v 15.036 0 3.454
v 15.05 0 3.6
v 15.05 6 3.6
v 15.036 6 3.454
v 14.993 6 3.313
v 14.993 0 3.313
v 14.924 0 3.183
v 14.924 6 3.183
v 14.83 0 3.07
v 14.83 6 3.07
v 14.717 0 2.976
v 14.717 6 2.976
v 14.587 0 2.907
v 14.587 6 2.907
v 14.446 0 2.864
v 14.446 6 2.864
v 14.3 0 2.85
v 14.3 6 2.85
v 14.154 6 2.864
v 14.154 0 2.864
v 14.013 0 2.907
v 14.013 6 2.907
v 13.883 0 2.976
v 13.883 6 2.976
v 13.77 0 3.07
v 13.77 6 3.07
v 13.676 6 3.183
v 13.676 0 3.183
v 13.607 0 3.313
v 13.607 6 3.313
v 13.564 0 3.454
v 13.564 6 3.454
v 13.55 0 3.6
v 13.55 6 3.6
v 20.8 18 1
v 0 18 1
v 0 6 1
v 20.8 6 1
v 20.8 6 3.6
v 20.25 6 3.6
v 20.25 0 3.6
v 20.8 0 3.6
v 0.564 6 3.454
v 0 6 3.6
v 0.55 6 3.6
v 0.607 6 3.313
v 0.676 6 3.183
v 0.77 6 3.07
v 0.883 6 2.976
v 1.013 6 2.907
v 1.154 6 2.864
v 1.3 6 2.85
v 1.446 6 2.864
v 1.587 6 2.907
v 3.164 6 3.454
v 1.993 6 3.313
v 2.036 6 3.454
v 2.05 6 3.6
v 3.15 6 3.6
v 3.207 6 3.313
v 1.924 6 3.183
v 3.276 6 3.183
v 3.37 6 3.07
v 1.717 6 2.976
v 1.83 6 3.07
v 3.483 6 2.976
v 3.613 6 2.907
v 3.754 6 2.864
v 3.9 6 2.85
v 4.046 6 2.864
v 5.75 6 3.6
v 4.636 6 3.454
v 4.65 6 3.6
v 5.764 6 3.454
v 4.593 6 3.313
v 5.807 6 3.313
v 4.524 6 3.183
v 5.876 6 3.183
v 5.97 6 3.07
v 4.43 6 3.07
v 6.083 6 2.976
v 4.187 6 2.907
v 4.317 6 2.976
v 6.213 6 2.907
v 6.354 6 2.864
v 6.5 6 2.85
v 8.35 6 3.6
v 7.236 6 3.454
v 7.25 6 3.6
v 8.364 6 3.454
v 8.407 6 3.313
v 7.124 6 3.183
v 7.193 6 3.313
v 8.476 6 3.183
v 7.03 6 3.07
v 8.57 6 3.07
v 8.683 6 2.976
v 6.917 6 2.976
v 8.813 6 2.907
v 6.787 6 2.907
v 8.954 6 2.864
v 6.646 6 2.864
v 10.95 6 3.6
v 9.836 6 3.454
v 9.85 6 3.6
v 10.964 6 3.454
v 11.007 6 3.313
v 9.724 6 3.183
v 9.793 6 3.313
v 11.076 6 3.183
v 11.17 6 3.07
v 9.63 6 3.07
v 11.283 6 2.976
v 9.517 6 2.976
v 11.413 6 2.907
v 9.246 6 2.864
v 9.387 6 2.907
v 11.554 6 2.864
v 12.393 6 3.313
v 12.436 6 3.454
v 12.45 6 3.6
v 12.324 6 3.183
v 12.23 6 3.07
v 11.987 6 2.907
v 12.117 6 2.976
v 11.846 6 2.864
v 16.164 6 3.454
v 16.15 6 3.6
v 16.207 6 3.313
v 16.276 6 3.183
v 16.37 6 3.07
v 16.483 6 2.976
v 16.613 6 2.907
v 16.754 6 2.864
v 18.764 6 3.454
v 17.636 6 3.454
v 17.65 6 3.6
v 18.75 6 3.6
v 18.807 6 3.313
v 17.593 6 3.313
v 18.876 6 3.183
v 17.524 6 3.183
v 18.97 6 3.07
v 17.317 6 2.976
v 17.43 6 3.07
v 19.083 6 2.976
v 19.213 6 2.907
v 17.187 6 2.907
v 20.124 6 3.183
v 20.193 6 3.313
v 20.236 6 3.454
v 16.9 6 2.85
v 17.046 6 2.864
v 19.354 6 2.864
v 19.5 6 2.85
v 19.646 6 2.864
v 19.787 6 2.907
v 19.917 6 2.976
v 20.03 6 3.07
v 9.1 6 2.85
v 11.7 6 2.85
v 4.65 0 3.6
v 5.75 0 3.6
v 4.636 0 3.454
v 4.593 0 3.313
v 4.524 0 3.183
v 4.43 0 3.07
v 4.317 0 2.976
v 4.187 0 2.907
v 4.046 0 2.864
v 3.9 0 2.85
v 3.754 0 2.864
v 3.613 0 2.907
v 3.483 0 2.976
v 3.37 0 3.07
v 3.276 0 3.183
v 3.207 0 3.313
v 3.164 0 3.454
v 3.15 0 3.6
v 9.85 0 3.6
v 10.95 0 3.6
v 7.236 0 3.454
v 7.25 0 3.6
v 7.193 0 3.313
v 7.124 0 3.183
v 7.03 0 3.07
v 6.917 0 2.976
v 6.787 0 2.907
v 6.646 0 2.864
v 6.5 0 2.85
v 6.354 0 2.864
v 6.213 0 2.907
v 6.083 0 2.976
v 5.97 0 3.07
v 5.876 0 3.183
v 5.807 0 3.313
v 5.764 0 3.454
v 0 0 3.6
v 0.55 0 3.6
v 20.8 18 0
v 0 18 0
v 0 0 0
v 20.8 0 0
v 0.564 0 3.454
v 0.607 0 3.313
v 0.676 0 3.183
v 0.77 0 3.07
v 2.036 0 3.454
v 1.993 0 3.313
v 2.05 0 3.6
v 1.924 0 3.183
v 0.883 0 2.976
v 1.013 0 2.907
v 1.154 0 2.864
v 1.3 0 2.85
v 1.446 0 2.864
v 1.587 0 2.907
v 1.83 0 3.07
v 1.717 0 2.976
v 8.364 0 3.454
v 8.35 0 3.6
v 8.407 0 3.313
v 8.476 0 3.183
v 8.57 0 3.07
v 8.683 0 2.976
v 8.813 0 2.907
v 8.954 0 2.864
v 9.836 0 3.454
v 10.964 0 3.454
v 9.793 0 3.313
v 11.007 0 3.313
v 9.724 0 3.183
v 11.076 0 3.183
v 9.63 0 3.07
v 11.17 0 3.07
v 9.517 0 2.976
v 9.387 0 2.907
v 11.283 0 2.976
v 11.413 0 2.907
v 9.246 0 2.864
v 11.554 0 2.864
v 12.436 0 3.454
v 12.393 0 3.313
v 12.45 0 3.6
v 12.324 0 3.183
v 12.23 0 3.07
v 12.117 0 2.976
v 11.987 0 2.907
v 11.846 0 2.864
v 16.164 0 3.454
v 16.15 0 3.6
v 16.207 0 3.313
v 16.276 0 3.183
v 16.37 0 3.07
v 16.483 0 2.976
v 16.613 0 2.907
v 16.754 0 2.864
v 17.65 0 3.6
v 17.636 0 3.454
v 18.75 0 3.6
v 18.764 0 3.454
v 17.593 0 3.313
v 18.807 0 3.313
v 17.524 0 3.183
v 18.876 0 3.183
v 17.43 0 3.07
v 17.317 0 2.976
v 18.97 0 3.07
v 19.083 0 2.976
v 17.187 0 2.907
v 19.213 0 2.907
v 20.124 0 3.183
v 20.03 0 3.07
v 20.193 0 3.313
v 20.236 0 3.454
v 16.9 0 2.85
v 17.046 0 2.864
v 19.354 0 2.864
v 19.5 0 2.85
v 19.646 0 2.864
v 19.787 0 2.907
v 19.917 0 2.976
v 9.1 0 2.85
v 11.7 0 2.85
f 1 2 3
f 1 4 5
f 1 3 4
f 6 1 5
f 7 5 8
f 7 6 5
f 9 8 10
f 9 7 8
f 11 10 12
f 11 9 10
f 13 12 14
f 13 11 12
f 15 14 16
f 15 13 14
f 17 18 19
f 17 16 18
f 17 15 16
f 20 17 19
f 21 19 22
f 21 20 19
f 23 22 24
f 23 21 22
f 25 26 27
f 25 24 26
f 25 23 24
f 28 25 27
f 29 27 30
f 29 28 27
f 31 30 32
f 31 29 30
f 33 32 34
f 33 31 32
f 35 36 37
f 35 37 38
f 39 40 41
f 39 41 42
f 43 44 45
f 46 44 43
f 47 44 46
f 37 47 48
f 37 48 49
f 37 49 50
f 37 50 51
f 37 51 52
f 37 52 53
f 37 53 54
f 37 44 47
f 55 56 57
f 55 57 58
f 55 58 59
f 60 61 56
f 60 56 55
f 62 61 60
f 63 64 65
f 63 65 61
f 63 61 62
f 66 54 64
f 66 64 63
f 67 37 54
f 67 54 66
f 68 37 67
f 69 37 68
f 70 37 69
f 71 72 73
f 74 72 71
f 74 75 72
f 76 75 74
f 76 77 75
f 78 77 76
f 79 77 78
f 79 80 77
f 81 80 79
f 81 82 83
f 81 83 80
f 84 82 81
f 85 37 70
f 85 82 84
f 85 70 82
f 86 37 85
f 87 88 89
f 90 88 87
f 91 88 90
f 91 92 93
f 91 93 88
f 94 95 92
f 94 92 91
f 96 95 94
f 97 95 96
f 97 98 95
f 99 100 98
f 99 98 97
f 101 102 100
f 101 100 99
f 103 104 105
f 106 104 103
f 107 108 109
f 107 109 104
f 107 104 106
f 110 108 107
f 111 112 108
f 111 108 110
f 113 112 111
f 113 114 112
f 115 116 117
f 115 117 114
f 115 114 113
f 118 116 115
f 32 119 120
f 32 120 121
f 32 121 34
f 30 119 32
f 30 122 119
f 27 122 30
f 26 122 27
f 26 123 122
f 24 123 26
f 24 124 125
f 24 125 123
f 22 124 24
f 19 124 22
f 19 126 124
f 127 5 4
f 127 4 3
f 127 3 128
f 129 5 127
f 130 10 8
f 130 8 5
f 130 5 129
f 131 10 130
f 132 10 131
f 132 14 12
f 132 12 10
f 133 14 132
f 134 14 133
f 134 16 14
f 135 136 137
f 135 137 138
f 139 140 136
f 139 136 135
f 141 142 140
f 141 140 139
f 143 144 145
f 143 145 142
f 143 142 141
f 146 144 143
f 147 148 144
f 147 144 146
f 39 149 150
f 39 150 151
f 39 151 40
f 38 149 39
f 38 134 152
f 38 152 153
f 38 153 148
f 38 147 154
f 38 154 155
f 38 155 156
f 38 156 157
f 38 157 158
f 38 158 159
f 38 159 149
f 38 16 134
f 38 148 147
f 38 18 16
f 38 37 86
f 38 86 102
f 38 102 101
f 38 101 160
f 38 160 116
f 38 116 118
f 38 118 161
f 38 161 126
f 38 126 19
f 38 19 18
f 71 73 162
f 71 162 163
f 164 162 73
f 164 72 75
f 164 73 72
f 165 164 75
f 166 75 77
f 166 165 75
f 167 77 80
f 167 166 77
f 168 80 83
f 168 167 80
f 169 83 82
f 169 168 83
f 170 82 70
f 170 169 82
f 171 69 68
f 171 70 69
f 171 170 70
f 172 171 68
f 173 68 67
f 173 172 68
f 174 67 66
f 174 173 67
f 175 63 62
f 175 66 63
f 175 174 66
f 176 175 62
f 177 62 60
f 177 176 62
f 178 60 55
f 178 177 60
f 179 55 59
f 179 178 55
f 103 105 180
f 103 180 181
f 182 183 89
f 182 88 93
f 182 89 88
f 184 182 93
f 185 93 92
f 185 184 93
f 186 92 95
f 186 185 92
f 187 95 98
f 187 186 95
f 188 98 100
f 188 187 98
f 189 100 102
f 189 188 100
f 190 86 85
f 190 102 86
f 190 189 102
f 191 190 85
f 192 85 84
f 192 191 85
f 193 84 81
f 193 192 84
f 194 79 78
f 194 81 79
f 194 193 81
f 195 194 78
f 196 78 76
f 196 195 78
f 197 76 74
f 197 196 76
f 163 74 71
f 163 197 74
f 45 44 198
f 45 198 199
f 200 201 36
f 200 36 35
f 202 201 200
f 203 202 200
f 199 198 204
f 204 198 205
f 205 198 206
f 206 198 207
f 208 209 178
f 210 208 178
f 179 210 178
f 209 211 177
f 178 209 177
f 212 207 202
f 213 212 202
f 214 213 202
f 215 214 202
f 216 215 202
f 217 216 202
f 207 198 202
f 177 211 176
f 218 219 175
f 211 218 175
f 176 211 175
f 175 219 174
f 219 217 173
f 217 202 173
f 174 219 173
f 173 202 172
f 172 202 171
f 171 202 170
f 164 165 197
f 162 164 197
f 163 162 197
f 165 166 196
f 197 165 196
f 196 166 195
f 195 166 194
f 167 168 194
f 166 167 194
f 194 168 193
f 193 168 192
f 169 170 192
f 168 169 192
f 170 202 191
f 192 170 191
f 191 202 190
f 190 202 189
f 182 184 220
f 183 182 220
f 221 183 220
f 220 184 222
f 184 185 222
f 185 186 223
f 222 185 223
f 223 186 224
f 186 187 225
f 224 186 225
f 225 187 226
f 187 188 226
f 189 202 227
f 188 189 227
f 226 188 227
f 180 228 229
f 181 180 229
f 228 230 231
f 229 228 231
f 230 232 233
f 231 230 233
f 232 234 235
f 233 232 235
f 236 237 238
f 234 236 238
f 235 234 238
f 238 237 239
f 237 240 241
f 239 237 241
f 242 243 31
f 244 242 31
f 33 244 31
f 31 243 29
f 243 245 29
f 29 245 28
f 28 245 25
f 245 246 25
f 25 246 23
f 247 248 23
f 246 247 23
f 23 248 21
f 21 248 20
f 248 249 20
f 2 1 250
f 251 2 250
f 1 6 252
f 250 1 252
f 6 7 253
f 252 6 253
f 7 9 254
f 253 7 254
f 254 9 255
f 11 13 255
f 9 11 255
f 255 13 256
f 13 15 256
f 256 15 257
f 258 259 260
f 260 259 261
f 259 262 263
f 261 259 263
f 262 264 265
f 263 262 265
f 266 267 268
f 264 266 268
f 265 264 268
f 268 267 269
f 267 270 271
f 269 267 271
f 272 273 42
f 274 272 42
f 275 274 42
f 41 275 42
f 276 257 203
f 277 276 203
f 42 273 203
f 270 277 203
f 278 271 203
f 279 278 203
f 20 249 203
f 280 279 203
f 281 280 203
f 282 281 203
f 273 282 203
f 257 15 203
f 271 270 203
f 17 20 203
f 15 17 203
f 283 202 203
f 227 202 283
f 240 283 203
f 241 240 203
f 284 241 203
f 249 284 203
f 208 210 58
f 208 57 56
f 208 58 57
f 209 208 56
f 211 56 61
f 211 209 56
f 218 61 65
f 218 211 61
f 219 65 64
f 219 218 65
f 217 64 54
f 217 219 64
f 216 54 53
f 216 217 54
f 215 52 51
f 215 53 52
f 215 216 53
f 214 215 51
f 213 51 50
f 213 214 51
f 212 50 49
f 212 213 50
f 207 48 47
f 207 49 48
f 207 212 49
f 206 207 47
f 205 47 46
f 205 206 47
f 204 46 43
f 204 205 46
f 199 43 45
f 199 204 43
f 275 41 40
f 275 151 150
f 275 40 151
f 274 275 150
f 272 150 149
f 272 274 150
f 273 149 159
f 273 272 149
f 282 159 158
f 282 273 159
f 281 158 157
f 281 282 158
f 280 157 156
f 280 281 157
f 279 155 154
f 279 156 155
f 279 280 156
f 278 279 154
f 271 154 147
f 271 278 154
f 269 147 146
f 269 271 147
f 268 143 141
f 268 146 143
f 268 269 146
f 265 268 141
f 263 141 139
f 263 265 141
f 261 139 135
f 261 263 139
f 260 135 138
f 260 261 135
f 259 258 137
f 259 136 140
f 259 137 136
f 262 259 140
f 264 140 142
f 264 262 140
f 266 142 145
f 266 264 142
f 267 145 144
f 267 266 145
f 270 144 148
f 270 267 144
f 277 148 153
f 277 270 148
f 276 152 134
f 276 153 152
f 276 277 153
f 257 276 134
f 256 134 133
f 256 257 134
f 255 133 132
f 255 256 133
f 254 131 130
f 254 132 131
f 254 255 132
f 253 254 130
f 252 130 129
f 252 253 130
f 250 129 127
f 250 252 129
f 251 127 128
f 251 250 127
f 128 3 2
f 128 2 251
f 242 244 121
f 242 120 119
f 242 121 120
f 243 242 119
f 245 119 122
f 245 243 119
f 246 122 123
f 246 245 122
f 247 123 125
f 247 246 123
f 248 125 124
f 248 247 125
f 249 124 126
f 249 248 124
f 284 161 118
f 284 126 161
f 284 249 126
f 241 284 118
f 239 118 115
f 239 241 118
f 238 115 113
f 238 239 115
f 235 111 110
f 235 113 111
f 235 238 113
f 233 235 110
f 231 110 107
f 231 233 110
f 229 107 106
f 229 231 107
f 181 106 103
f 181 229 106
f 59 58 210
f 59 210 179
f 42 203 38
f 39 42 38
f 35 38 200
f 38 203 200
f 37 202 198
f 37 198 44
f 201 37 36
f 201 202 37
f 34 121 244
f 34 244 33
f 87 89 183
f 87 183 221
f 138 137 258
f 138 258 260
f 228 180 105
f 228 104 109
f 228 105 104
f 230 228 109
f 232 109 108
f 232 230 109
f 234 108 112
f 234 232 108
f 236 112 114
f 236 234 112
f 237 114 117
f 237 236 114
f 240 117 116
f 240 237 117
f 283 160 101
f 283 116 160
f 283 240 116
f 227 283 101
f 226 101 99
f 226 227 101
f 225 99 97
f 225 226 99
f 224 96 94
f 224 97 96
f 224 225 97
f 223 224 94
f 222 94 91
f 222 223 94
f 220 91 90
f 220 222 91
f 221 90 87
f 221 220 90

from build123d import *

# Parameters (mm, degrees)
BOX022_W          = 30
BOX022_H          = 20
BOX022_DEPTH      = 9.2
BOX011_W          = 26
BOX011_H          = 12
BOX011_DEPTH      = 5.2
CYLINDER005_R     = 0.75
CYLINDER005_DEPTH = 7
ARRAY005_X_COUNT  = 8
ARRAY005_X_PITCH  = 2.6
ARRAY005_Y_COUNT  = 2
ARRAY005_Y_PITCH  = 1
BOX010_W          = 20.8
BOX010_H          = 18
BOX010_DEPTH      = 7.2


with BuildPart() as cortador006:
    # Box022 → Box022 (new body)
    with BuildSketch(Plane(origin=(-1, -2, 3.6), x_dir=(1, 0, 0), z_dir=(0, 0, 1))):
        with Locations((15, 10)):
            Rectangle(BOX022_W, BOX022_H)
    extrude(amount=BOX022_DEPTH)


with BuildPart() as cube_10_base007:
    # Box011 → Box011 (new body)
    with BuildSketch(Plane(origin=(0, 6, 1), x_dir=(1, 0, 0), z_dir=(0, 0, 1))):
        with Locations((13, 6)):
            Rectangle(BOX011_W, BOX011_H)
    extrude(amount=BOX011_DEPTH)


with BuildPart() as array005:
    # Cylinder005 → Cylinder005 (new body)
    with BuildSketch(Plane(origin=(1.3, -1, 3.6), x_dir=(1, 0, 0), z_dir=(0, 1, 0))):
        Circle(CYLINDER005_R)
    extrude(amount=CYLINDER005_DEPTH)

    # Array005 X: Array005 ×8


with BuildPart() as array005_1:
    add(array005.part)
    with Locations(*[(i * ARRAY005_X_PITCH, 0, 0) for i in range(1, ARRAY005_X_COUNT)]):
        add(array005.part)

    # Array005 Y: Array005 ×2


with BuildPart() as array005_2:
    add(array005_1.part)
    with Locations(*[(0, i * ARRAY005_Y_PITCH, 0) for i in range(1, ARRAY005_Y_COUNT)]):
        add(array005_1.part)


with BuildPart() as bloque8_abajo:
    # Box010 → Box010 (new body)
    with BuildSketch(Plane.XY):
        with Locations((10.4, 9)):
            Rectangle(BOX010_W, BOX010_H)
    extrude(amount=BOX010_DEPTH)

    # Cut011: cut Array005
    add(array005_2.part, mode=Mode.SUBTRACT)

    # Cut010: cut cube_10_base007
    add(cube_10_base007.part, mode=Mode.SUBTRACT)

    # Cut021: cut cortador006
    add(cortador006.part, mode=Mode.SUBTRACT)


solid = bloque8_abajo.part
